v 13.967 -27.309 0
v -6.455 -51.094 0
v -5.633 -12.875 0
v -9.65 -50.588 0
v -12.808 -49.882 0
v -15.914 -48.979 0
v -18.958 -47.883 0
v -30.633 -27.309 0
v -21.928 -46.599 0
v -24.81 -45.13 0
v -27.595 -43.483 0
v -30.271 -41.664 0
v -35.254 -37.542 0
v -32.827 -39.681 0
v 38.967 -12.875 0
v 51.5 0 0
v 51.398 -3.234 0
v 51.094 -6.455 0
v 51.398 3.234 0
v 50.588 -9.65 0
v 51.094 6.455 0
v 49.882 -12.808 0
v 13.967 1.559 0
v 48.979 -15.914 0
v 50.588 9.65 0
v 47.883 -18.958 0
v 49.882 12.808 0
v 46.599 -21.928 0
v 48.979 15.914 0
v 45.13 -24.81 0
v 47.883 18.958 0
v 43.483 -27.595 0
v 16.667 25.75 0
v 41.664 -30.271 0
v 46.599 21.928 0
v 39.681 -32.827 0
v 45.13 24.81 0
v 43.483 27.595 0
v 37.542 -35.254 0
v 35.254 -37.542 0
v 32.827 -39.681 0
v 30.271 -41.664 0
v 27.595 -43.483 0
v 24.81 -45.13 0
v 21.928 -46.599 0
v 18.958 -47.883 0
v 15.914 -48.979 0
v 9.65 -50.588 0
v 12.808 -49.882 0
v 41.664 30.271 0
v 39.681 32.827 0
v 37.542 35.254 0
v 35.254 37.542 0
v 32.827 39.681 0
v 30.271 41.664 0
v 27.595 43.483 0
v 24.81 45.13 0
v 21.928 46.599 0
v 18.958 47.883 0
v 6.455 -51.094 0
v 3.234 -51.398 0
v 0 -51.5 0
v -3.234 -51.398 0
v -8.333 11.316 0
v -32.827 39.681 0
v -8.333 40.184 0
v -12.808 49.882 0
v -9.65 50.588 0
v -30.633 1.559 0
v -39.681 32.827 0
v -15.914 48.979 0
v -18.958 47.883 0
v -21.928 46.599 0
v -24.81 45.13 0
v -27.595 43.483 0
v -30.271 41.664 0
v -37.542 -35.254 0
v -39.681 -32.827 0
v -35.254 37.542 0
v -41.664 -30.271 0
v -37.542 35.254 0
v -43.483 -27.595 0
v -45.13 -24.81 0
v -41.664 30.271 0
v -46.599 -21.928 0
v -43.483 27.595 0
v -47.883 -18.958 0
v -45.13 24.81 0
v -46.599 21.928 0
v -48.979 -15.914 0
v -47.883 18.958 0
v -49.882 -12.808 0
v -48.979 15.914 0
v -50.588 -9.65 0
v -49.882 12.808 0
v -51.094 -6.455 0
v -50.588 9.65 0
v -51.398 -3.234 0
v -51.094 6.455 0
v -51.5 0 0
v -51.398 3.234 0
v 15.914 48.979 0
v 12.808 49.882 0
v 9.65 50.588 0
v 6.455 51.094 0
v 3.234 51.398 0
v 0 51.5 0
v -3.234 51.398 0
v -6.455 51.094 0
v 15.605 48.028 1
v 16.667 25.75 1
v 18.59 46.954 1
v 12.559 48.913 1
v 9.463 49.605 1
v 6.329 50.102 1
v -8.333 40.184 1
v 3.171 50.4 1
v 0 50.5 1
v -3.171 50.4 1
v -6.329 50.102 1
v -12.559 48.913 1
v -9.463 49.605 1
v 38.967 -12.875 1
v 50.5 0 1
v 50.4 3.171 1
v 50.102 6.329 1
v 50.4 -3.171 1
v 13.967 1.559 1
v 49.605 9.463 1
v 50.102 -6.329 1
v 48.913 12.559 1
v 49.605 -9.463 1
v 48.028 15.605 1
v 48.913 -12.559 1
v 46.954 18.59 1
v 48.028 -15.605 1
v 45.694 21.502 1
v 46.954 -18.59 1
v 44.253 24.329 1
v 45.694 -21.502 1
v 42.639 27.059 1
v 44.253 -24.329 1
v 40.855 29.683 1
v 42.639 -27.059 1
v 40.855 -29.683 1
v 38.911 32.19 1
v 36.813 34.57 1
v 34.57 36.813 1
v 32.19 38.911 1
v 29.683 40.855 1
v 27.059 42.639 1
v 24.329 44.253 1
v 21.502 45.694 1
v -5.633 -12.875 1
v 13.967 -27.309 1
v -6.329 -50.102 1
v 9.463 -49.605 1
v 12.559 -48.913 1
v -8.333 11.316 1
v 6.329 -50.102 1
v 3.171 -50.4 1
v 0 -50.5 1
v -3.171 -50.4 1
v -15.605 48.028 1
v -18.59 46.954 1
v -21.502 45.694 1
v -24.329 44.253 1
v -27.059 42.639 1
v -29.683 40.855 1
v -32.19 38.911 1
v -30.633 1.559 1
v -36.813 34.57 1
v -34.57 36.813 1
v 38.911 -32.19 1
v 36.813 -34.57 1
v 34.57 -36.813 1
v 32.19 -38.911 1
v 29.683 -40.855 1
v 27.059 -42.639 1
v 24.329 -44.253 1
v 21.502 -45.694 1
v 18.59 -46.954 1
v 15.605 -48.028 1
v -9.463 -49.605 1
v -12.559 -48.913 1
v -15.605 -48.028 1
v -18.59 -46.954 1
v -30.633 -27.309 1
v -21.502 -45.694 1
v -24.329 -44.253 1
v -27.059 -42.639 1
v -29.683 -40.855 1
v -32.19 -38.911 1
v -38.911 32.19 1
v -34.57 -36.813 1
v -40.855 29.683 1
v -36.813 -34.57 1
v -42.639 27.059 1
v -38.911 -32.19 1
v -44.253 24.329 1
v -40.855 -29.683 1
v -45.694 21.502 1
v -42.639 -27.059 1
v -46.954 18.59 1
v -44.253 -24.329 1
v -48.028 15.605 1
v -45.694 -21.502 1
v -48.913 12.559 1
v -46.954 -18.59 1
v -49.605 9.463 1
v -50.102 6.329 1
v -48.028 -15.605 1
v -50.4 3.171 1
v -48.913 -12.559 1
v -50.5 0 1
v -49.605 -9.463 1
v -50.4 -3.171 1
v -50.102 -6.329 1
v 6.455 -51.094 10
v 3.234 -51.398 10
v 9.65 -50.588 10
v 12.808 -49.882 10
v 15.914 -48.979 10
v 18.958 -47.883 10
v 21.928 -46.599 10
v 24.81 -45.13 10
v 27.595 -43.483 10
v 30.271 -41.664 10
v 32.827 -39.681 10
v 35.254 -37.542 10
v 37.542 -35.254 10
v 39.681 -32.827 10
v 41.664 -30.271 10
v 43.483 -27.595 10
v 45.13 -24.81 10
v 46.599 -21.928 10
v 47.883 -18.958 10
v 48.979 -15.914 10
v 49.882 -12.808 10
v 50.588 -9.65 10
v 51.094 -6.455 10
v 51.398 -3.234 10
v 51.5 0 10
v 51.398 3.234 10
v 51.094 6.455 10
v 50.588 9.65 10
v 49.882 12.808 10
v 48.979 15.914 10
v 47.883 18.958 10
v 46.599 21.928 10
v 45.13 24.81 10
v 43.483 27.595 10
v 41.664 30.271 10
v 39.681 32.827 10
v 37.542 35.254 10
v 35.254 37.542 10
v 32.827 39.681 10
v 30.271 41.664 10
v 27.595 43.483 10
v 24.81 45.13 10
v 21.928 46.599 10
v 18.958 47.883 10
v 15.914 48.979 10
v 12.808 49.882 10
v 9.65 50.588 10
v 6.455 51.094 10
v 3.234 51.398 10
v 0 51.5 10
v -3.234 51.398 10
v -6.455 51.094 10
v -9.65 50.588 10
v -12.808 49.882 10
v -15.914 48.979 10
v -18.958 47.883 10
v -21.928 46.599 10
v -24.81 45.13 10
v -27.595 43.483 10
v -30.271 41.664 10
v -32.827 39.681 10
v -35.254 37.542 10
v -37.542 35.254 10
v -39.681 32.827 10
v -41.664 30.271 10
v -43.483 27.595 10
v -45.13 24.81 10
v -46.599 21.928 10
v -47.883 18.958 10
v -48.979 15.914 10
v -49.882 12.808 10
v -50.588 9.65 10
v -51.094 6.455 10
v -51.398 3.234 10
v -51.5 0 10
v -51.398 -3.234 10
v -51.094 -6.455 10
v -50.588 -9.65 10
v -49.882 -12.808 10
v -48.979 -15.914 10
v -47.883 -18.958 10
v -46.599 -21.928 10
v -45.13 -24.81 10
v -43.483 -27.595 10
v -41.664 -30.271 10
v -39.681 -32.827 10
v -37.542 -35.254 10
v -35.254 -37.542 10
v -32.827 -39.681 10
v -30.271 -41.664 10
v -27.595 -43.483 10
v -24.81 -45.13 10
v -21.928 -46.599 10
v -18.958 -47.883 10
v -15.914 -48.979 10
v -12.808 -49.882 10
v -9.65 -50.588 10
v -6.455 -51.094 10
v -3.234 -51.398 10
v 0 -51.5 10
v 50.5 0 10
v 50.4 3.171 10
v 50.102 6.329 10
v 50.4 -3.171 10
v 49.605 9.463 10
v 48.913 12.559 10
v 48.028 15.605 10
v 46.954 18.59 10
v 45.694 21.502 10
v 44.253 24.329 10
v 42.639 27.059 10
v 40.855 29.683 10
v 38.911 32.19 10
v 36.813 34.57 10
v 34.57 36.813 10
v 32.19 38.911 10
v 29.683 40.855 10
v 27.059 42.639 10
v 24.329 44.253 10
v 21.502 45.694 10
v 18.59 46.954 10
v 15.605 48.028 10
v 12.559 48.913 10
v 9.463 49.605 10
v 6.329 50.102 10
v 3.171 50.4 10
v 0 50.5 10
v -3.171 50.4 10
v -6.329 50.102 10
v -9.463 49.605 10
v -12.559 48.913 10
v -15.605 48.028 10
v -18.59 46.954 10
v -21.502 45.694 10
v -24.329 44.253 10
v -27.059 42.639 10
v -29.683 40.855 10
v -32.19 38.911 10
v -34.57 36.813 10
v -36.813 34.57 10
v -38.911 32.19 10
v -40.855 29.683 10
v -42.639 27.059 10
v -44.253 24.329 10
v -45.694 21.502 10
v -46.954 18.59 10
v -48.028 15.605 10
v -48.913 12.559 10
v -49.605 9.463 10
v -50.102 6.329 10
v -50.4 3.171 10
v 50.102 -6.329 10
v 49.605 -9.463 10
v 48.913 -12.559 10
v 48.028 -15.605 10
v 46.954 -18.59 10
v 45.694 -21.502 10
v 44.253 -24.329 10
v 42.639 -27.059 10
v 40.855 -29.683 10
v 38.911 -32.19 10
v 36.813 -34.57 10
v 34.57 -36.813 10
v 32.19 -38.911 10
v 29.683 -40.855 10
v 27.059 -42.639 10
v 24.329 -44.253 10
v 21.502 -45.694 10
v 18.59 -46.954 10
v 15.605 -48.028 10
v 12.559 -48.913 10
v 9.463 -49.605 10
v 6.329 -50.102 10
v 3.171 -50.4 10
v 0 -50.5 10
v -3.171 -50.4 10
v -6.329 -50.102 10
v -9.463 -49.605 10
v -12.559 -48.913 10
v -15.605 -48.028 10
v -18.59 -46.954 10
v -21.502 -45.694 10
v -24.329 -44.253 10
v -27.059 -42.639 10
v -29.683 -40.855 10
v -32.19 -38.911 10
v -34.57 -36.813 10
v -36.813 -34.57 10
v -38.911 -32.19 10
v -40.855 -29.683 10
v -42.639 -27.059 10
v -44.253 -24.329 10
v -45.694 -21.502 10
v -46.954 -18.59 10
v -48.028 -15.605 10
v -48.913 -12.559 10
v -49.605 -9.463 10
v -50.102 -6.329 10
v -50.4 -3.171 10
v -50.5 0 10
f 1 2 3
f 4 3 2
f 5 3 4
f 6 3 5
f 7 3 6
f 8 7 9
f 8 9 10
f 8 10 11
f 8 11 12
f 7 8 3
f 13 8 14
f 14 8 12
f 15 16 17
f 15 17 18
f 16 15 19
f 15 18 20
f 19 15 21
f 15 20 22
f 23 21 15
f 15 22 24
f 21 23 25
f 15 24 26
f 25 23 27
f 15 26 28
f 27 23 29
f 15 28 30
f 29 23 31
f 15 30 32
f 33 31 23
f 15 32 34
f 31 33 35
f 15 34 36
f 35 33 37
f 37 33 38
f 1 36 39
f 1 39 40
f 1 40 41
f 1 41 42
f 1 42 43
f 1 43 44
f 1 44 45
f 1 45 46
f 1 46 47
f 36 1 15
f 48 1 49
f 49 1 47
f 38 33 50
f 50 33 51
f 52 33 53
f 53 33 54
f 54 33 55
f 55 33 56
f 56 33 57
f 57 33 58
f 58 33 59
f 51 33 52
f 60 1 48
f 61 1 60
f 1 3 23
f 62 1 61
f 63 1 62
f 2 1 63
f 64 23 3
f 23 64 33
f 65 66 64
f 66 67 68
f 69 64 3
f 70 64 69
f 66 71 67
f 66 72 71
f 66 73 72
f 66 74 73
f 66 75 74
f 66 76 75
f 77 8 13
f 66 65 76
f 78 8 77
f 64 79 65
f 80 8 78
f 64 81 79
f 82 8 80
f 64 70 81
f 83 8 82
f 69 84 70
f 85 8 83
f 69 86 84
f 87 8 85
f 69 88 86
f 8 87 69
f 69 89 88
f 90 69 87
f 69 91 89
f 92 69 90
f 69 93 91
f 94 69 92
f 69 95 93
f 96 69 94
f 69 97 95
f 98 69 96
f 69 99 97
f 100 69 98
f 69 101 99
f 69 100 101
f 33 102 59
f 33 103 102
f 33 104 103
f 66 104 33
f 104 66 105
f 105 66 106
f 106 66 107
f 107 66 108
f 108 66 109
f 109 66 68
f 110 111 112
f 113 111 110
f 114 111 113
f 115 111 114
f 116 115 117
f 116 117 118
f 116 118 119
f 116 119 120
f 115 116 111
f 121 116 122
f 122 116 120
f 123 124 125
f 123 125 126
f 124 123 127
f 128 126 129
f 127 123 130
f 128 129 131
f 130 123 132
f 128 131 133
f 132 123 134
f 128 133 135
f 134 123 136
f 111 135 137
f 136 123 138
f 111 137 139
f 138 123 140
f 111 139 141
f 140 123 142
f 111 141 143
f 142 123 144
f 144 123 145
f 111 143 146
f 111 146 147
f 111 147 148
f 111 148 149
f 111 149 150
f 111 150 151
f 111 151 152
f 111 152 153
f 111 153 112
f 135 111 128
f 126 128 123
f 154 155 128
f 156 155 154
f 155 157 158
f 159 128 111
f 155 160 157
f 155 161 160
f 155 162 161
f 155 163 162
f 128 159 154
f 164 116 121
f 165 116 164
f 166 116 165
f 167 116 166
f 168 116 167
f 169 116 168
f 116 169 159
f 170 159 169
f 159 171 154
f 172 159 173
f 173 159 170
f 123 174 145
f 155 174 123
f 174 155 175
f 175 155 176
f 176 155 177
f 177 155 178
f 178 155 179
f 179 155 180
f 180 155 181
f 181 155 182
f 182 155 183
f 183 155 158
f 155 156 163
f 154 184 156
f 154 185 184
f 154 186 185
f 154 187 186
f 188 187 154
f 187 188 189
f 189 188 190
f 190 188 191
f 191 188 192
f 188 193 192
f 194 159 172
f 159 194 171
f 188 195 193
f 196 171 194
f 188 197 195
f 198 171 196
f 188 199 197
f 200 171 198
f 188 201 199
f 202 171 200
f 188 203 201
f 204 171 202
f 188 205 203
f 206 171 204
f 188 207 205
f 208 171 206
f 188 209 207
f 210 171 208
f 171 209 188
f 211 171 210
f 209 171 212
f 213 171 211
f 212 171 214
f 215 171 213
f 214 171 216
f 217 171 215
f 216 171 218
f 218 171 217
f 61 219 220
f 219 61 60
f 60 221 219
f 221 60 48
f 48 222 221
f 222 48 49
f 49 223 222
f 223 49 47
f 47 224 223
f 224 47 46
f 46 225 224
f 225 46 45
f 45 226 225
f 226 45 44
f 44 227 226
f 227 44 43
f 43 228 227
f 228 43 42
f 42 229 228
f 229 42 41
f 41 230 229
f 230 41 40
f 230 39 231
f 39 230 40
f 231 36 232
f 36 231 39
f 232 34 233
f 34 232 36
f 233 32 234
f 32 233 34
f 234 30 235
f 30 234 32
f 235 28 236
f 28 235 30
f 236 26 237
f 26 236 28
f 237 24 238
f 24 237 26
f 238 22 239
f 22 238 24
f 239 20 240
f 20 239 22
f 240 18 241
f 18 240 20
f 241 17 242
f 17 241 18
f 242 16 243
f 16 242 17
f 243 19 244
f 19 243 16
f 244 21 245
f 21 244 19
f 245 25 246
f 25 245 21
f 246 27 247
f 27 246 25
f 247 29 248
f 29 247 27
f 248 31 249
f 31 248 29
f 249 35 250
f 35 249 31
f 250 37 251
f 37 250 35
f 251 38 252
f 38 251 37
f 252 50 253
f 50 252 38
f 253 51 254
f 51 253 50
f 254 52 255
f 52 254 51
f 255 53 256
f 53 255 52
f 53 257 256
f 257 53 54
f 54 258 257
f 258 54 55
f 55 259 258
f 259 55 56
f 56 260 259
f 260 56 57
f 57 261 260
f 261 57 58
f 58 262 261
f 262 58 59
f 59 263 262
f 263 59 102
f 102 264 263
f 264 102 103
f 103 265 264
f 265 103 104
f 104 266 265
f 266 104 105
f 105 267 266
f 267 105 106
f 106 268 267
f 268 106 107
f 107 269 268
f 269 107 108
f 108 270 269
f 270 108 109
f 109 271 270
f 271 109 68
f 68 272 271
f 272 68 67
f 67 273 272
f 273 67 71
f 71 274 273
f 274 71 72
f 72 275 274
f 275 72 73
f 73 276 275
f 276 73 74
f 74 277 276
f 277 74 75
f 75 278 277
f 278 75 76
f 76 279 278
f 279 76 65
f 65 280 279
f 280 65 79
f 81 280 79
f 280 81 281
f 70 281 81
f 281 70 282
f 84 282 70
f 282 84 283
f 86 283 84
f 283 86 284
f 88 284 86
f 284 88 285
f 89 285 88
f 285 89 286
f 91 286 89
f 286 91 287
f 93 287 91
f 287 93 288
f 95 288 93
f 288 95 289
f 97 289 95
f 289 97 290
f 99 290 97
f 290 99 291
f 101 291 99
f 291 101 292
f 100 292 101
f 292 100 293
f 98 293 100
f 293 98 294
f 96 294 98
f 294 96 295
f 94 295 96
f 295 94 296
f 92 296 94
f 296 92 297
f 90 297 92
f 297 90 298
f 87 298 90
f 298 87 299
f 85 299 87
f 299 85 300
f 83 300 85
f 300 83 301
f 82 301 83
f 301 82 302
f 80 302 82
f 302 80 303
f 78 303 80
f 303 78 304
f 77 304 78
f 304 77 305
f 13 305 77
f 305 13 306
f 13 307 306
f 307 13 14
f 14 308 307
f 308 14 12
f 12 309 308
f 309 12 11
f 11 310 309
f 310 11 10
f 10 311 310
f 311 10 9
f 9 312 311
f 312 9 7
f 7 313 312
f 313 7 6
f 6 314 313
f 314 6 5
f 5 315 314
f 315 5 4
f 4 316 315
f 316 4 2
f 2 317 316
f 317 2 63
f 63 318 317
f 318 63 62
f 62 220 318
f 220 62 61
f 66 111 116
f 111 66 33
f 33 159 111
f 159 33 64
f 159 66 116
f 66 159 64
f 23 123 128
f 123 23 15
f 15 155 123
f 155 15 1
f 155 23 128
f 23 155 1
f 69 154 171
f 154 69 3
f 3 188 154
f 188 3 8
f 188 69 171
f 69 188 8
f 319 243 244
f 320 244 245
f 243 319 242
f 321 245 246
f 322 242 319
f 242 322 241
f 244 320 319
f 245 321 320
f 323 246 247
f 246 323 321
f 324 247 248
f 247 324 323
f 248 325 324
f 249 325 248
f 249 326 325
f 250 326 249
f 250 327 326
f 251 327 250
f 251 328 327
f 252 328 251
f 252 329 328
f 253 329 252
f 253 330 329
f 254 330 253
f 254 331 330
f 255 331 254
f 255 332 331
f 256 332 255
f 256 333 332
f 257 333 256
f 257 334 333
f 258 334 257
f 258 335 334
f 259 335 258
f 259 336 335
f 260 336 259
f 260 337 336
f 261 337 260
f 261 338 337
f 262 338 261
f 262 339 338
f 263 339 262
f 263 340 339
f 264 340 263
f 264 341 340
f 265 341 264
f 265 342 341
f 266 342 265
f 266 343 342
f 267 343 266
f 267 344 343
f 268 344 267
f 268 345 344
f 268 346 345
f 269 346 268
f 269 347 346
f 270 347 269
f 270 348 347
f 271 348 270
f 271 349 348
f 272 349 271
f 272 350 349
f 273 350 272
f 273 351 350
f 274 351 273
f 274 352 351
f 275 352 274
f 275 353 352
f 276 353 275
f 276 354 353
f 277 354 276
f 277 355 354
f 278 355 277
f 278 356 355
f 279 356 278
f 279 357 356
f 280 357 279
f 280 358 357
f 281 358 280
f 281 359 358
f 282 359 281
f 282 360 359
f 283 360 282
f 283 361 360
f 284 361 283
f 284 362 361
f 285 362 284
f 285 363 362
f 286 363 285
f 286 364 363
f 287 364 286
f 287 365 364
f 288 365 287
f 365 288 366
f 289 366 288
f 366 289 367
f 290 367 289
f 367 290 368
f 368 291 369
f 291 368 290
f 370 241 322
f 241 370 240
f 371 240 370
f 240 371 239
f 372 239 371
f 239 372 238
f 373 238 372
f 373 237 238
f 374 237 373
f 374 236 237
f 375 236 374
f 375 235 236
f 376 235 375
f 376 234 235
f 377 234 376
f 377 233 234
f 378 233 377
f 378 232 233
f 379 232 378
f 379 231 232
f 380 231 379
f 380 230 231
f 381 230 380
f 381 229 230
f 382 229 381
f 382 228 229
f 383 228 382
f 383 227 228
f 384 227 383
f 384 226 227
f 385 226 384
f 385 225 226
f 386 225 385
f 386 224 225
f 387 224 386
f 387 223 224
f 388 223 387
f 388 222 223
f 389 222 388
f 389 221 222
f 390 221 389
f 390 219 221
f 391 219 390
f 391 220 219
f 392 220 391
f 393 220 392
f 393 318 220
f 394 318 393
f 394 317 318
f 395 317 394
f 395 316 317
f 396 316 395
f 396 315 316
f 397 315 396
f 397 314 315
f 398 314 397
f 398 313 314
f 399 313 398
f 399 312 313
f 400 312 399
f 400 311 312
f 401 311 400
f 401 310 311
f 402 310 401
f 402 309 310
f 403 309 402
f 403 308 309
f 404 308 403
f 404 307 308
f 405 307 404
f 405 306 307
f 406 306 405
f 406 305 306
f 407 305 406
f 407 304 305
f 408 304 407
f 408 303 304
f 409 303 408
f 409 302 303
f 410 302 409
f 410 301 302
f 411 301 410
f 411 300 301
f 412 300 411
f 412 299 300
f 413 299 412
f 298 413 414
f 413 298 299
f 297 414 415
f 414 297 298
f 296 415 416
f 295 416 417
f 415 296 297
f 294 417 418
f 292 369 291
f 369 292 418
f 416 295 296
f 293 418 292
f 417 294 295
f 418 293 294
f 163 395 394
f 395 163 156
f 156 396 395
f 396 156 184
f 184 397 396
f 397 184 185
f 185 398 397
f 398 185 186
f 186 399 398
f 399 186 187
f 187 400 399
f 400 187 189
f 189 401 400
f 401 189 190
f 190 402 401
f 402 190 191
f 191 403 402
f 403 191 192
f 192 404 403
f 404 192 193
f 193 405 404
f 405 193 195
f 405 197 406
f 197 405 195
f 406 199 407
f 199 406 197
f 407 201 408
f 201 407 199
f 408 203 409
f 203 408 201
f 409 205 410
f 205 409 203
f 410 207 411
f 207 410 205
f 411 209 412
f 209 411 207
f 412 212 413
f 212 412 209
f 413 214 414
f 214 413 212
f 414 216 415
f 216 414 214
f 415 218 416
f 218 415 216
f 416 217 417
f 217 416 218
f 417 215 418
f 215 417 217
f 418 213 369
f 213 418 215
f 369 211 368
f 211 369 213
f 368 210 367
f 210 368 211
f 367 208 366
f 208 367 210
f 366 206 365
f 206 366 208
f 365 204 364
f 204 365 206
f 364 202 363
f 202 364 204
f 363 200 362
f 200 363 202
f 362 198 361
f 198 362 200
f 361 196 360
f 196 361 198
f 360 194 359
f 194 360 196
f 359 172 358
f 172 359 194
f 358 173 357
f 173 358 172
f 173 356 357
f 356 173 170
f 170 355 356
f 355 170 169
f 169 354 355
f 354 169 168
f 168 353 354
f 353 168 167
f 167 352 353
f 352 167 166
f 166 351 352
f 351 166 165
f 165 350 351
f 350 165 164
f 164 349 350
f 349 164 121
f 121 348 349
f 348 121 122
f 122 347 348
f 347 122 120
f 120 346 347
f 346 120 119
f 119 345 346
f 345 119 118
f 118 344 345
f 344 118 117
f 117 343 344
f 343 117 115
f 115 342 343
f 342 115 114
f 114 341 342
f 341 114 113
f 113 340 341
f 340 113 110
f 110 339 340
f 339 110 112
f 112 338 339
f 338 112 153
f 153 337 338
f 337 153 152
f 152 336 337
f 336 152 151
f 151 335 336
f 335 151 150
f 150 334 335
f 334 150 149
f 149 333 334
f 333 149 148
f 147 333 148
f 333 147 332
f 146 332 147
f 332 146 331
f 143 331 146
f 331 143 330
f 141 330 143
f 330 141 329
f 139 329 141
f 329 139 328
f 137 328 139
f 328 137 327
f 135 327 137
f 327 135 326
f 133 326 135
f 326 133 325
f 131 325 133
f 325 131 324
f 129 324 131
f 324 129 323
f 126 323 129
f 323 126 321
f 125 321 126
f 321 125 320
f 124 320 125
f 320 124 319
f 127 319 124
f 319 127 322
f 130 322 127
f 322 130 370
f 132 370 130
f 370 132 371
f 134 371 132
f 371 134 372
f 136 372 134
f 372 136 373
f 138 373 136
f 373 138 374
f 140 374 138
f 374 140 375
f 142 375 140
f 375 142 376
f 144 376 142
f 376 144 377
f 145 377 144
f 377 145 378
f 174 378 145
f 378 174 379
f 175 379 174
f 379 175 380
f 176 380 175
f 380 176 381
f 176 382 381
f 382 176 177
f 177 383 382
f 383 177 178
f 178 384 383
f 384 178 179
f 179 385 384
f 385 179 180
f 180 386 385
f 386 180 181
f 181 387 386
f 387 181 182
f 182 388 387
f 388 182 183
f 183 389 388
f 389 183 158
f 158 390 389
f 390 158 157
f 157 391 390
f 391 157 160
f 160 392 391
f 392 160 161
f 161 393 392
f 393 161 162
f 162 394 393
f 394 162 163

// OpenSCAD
/*
   Hartmann Mask
   Andrew Lin, November 2021
*/


/********************
   Settings. 
*********************/

/*
   Number of facets to use when creating shapes. Larger is smoother,
   but will take longer to compute.
*/
$fn = 100;

/*
   Diameter of the thing the mask has to fit over, in millimeters.
   This is most likely the outer diameter of the OTA at the
   objective.
*/
ota_diameter = 100;

/*
   Amount of total extra space between the cap's wall and the OTA it
   is going over, in millimeters.
*/
padding = 1;

/*
   Thickness of the mask's outer wall, in millimeters.
*/
wall_thickness = 1;

/*
   Height of the outer wall, in millimeters.
*/
wall_height = 10;

/*
   Thickness of the face of the mask, in millimeters.
*/
face_thickness = 1;

/*
   Diameter of holes to put in the printed cap, in millimeters.
   For non-circular apertures, this is the diameter of the inscribed
   circle, so the actual polygons are slightly smaller.
*/
aperture = ota_diameter / 3;


/********************
   Computed Values.
*********************/

inner_diameter = ota_diameter + padding;
outer_diameter = inner_diameter + (2 * wall_thickness);


/********************
   Modules.
*********************/

module face(diameter, aperture, thickness) {
    offset = diameter / 4;  // Half the face radius.
    dx = offset * cos(30);
    dy = offset * sin(30);
    linear_extrude(height = thickness) {
        difference() {
            circle(d = diameter);
            
            // If you want circles, delete the $fn arguments.
            translate([0, offset, 0]) circle(d = aperture, $fn = 3);
            translate([dx, -dy, 0]) circle(d = aperture, $fn = 3);
            translate([-dx, -dy, 0]) circle(d = aperture, $fn = 3);
        }
    }
}

module wall(id, od, h) {
    linear_extrude(height = h) {
        difference() {
            circle(d = od);
            circle(d = id);
        }
    }
}


/********************
   Assembly.
*********************/

union() {
    face(outer_diameter, aperture, face_thickness);
    wall(inner_diameter, outer_diameter, wall_height);
}
